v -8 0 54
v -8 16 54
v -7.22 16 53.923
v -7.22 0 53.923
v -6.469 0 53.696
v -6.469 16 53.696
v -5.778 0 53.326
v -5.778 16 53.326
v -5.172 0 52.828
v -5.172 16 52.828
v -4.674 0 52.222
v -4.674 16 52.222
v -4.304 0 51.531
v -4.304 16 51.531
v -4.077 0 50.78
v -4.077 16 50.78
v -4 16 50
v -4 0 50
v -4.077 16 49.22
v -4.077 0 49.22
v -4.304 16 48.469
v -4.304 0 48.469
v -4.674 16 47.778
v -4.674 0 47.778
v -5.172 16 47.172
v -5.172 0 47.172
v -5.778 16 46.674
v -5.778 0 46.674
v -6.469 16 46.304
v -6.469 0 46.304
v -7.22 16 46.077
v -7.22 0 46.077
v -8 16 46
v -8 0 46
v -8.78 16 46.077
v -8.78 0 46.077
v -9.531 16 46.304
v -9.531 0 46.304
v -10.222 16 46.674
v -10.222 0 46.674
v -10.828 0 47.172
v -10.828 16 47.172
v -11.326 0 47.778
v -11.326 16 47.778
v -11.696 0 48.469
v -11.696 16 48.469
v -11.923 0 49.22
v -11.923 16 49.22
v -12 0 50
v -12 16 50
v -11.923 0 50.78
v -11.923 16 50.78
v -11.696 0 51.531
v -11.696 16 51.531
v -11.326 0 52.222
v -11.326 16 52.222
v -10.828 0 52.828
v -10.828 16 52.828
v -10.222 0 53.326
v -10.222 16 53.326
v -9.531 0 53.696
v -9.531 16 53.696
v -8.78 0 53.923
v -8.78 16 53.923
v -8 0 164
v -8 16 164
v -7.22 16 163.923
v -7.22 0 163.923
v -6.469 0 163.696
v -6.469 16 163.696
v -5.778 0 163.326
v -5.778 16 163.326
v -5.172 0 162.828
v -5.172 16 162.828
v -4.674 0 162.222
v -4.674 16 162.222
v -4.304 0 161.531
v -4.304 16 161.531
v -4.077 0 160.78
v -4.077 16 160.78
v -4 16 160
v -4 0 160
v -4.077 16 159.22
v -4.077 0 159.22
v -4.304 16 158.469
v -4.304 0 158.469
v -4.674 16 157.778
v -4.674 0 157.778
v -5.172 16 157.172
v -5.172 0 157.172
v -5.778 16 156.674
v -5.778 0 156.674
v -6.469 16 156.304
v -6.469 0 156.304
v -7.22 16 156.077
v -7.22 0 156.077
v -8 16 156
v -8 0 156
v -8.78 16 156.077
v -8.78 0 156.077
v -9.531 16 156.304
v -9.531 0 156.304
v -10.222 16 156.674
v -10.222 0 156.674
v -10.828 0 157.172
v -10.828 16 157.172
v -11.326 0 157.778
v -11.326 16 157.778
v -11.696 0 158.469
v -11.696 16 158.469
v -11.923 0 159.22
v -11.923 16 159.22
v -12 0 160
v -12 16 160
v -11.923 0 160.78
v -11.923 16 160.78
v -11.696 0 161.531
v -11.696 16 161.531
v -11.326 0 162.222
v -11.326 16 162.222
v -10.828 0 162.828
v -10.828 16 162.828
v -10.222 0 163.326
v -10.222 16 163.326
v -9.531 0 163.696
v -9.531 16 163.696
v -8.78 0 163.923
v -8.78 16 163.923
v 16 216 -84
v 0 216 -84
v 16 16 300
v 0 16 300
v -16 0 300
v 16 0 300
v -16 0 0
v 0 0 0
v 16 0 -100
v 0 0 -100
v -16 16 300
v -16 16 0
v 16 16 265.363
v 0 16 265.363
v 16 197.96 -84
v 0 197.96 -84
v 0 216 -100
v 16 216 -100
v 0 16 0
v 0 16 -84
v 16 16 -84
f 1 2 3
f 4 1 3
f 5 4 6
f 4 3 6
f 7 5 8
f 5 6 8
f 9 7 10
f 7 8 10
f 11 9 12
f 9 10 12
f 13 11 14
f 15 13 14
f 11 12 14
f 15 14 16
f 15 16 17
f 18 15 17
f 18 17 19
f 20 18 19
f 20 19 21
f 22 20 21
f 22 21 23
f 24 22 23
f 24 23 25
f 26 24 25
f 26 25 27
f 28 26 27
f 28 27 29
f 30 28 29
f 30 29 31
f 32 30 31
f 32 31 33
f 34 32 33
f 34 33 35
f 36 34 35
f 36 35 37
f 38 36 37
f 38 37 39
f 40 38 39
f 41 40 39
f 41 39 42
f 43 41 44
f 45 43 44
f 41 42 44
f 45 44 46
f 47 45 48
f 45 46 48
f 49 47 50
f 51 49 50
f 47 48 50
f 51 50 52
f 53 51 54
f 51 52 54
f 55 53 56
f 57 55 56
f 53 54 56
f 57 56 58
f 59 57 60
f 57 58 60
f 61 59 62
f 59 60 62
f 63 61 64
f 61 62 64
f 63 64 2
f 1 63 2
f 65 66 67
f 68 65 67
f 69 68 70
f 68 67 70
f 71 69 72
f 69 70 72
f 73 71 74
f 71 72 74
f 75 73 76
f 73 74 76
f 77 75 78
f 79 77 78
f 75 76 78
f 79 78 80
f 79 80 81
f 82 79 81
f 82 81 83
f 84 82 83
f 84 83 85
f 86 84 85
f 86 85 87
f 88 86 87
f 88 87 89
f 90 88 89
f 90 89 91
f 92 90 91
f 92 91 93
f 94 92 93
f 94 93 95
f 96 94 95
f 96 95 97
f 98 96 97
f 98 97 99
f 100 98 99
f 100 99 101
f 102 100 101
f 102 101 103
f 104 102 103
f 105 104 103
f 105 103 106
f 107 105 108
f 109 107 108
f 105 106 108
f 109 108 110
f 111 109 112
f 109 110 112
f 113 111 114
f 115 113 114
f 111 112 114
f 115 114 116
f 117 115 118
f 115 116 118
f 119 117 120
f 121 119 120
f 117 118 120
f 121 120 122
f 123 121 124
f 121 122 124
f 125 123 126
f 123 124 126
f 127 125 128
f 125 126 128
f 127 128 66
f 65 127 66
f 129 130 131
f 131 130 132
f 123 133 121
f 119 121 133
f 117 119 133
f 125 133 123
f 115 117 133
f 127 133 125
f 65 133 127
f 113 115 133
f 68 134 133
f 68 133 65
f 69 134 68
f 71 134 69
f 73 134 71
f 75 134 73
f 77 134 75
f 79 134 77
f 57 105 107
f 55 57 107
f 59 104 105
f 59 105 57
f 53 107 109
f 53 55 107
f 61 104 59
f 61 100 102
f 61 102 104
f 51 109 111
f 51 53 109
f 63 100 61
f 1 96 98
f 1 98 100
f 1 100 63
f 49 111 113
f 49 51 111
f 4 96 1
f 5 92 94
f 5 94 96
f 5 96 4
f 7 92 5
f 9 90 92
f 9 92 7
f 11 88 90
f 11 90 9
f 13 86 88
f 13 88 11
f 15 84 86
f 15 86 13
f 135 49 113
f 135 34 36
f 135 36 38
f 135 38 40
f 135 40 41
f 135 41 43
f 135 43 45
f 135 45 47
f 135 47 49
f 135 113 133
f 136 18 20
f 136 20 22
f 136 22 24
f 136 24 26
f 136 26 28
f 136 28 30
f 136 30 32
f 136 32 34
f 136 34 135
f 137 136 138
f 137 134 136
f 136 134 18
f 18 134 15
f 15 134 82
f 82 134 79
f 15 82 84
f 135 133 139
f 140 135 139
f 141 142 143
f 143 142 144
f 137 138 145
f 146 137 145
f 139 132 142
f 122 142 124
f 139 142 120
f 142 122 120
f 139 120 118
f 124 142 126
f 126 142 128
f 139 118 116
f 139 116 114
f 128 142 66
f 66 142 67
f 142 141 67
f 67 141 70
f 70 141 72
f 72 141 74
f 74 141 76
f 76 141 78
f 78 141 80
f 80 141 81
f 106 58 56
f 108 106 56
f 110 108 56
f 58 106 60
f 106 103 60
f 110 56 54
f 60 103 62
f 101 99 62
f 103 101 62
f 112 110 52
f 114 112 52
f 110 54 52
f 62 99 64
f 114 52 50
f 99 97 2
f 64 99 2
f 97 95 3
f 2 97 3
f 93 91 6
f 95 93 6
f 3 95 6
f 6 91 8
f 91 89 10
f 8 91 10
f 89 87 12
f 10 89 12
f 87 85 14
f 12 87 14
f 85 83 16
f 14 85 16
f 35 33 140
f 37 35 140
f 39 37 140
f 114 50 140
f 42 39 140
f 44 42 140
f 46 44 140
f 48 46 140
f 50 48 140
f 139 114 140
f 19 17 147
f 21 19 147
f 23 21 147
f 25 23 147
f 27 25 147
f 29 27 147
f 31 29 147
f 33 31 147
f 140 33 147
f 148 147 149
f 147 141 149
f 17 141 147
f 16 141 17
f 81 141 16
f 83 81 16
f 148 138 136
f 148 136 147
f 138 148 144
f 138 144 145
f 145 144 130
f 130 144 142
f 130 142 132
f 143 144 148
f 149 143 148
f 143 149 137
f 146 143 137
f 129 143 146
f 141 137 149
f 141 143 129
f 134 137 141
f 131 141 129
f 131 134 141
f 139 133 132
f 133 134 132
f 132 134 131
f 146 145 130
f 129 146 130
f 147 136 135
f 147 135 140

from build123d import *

# Parameters (mm, degrees)
PAD_DEPTH    = 16
SKETCH001_W  = 16
SKETCH001_H  = 300
PAD001_DEPTH = 16
SKETCH002_R  = 4
POCKET_DEPTH = 16.001


with BuildPart() as part:
    # Sketch → Pad (new body)
    with BuildSketch(Plane.YZ):
        Polygon((0, 0), (0, -100), (16, -100), (216, -100), (216, -84), (16, 300), (0, 300), align=None)
        Polygon((16, 265.363049), (197.959921, -84), (16, -84), align=None, mode=Mode.SUBTRACT)
    extrude(amount=PAD_DEPTH)

    # Sketch001 (on Face4 of Pad) → Pad001 (join)
    with BuildSketch(Plane(origin=(0, 0, 0), x_dir=(0, 1, 0), z_dir=(-1, 0, 0))):
        with Locations((8, -150)):
            Rectangle(SKETCH001_W, SKETCH001_H)
    extrude(amount=PAD001_DEPTH)

    # Sketch002 (on Face12 of Pad001) → Pocket (cut, through all)
    with BuildSketch(Plane.ZX.offset(16)):
        with Locations((50, -8)):
            Circle(SKETCH002_R)
        with Locations((160, -8)):
            Circle(SKETCH002_R)
    extrude(amount=-POCKET_DEPTH, mode=Mode.SUBTRACT)


solid = part.part
